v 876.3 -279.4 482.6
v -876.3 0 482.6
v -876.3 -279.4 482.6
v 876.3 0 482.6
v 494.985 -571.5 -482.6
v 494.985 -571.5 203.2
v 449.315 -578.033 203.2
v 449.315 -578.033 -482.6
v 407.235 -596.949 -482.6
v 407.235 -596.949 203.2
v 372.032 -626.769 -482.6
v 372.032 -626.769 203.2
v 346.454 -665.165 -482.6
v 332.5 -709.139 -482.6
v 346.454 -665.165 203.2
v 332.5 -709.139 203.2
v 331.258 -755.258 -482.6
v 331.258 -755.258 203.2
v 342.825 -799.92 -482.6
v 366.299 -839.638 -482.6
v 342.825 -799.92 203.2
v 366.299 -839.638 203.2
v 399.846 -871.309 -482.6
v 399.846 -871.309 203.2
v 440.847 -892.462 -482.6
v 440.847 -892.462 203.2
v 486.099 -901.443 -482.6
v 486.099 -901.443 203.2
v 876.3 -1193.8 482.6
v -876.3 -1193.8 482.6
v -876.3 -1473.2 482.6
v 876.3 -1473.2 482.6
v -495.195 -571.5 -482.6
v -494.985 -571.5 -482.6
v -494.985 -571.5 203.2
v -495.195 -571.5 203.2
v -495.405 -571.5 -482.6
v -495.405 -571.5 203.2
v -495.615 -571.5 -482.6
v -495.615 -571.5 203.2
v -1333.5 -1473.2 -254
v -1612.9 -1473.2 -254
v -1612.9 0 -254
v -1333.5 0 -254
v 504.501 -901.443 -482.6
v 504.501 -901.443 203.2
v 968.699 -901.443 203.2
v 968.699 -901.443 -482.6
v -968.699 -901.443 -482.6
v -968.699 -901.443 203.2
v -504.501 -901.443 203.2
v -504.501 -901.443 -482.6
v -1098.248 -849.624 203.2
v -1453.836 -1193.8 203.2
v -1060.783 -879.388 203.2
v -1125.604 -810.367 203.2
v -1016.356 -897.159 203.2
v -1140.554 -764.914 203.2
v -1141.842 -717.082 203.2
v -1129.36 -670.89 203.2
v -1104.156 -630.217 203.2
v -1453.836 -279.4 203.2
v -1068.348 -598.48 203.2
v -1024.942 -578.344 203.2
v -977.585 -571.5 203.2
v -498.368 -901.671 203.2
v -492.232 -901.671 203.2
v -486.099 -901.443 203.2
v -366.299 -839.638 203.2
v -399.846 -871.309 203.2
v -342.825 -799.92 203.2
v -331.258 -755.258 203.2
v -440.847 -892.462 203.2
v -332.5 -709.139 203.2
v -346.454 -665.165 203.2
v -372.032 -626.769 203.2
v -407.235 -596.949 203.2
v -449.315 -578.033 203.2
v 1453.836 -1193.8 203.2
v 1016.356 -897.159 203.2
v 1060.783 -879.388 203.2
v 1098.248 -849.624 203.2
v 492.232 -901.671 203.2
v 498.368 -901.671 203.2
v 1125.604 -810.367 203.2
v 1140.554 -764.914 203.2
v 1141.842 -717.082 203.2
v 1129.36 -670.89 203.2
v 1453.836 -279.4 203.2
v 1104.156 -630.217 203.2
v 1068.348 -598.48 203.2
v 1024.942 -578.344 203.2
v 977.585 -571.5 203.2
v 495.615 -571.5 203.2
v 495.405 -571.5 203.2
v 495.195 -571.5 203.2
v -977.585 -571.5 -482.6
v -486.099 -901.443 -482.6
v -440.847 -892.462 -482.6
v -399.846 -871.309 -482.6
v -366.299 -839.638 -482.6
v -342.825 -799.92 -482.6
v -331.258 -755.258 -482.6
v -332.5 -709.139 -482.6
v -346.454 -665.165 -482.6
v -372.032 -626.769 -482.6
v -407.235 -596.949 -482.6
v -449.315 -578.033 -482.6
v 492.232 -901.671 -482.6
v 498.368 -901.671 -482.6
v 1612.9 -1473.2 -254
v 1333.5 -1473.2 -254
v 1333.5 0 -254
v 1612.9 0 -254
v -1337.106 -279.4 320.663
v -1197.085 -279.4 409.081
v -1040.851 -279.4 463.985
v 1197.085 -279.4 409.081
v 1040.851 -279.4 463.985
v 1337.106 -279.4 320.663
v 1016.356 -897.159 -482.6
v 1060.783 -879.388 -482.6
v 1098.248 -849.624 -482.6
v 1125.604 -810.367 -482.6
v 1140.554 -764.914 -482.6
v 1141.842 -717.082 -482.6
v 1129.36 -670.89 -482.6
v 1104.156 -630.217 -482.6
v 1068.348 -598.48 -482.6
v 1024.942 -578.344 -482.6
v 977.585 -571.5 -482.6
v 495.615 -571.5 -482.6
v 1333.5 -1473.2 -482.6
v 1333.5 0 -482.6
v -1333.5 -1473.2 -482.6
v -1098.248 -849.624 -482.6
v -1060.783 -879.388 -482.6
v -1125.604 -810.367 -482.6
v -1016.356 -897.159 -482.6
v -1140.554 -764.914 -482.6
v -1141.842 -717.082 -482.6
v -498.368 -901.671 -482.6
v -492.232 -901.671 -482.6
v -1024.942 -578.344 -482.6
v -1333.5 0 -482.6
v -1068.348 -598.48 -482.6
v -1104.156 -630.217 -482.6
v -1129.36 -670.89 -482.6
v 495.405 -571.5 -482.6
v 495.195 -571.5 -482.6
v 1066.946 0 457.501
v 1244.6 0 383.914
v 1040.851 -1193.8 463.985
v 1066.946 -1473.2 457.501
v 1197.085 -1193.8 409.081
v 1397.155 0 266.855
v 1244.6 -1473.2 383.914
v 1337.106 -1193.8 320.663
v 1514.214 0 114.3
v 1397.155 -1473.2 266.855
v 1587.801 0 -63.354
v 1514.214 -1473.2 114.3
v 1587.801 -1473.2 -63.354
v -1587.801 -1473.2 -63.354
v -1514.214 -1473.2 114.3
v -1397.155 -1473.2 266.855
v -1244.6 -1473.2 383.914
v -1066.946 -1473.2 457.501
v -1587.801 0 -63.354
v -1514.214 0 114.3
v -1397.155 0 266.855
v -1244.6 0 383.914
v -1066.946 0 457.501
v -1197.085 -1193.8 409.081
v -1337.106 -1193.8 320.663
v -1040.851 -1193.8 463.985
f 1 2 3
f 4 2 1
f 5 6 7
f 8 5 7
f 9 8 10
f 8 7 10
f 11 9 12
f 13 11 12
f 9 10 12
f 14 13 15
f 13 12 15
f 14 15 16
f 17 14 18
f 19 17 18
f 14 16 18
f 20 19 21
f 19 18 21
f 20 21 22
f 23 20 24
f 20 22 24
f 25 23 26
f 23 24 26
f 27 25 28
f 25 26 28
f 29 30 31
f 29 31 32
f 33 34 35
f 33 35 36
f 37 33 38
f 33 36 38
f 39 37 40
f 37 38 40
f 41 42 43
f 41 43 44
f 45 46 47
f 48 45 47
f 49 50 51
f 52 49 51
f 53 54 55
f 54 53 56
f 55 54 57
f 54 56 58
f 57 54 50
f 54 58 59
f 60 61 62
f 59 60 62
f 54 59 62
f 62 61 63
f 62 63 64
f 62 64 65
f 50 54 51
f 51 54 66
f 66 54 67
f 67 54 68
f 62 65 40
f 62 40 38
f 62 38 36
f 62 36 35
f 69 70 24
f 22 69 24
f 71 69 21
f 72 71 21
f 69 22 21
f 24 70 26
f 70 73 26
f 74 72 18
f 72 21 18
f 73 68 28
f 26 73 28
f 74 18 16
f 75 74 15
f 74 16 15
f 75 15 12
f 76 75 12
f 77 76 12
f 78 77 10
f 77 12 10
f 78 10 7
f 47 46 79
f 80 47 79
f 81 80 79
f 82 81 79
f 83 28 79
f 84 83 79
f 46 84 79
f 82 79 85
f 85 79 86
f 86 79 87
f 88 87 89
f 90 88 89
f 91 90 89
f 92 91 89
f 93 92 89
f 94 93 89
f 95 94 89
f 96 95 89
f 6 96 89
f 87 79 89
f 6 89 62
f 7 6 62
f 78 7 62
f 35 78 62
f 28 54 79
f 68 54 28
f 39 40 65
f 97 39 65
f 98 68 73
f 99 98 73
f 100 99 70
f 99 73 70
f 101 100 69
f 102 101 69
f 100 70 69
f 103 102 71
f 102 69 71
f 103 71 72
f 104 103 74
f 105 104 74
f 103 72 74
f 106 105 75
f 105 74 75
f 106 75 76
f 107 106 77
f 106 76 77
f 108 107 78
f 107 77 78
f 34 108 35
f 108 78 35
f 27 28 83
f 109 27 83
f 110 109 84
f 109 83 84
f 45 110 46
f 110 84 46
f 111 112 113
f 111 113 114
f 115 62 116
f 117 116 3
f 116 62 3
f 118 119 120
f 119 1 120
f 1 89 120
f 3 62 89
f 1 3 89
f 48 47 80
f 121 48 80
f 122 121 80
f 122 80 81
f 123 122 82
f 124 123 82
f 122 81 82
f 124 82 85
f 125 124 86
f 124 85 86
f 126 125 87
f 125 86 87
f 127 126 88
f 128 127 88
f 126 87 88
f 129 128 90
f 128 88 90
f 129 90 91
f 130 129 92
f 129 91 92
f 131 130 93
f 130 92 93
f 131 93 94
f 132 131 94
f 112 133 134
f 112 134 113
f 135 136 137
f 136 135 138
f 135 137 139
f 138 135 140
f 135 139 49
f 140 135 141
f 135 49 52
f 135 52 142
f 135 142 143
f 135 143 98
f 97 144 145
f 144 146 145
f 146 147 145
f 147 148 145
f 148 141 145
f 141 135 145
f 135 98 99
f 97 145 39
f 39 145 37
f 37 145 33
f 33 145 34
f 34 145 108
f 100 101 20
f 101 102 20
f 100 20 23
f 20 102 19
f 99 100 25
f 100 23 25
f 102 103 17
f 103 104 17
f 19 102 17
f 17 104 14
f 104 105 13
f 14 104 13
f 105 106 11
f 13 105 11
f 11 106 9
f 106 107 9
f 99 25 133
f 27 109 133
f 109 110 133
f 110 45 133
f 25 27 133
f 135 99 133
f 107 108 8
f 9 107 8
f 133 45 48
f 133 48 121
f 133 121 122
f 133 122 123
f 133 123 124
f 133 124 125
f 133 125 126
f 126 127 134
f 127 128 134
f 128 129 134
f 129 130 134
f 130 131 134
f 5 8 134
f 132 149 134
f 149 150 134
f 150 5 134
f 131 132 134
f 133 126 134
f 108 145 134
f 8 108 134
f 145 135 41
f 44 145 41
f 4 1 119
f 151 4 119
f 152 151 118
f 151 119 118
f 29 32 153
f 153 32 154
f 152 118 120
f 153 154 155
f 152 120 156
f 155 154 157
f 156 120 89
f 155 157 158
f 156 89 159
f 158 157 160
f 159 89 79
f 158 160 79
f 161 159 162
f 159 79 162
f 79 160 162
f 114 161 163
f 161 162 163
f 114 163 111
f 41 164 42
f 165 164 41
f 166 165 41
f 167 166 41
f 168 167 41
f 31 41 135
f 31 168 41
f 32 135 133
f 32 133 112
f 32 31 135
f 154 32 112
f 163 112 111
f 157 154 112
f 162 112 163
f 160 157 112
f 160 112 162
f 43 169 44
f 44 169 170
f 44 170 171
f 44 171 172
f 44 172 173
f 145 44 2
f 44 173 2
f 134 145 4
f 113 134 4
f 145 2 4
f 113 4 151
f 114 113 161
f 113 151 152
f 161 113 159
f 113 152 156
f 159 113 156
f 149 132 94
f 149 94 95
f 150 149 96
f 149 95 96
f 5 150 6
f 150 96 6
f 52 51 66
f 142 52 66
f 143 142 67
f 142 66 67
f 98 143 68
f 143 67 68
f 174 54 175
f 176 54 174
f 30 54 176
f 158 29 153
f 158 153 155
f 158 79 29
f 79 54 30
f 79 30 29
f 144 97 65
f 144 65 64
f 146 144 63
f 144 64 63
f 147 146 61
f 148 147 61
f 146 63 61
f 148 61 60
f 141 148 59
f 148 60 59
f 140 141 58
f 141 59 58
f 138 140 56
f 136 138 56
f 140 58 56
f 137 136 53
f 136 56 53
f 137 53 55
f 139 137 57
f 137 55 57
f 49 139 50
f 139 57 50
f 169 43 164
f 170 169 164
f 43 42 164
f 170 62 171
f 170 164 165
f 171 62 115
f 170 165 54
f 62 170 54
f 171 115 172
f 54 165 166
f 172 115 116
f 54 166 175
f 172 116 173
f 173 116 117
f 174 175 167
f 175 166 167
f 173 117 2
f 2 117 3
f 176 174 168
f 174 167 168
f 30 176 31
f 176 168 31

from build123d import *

# Parameters (mm, degrees)
F0_W     = 3225.8
F0_H     = 965.2
F1_DEPTH = 1473.2
F3_DEPTH = 965.201
F4_W     = 914.4
F4_H     = 279.4
F5_DEPTH = 3225.801
F6_W     = 279.4
F6_H     = 228.6
F7_DEPTH = 1473.201
F8_R     = 736.59999


# Not quite as in the source:
# - a fillet or chamfer is up to 0.001 mm smaller than in the source, because OpenCascade refuses the exact size


with BuildPart() as f1:
    # F0 (on Front) → F1 (new body)
    with BuildSketch(Plane.XZ):
        Rectangle(F0_W, F0_H)
    extrude(amount=F1_DEPTH)

    # F2 (on face) → F3 (cut, through all)
    with BuildSketch(Plane.XY.offset(482.6)):
        with BuildLine():
            Line((-495.6148372224, -571.5003001895), (-977.5851627776, -571.5003001895))
            ThreePointArc((-977.5851627776, -571.5003001895), (-1142.9401608263, -741.0446950901), (-968.6994670012, -901.4434414605))
            Line((-968.6994670012, -901.4434414605), (-504.5005329988, -901.4434414605))
            Line((-504.5005329988, -901.4434414605), (-486.0994670012, -901.4434414605))
            ThreePointArc((-486.0994670012, -901.4434414605), (-330.2598391737, -732.15530491), (-494.9851627776, -571.5003001895))
            Line((-494.9851627776, -571.5003001895), (-495.6148372224, -571.5003001895))
        make_face()
        with BuildLine():
            ThreePointArc((-494.9851627776, -571.5003001895), (-495.3, -571.5), (-495.6148372224, -571.5003001895))
            Line((-495.6148372224, -571.5003001895), (-494.9851627776, -571.5003001895))
        make_face()
        with BuildLine():
            Line((-486.0994670012, -901.4434414605), (-504.5005329988, -901.4434414605))
            ThreePointArc((-504.5005329988, -901.4434414605), (-495.3, -901.7), (-486.0994670012, -901.4434414605))
        make_face()
        with BuildLine():
            ThreePointArc((968.6994670012, -901.4434414605), (1142.9401608263, -741.0446950901), (977.5851627776, -571.5003001895))
            Line((977.5851627776, -571.5003001895), (495.6148372224, -571.5003001895))
            Line((495.6148372224, -571.5003001895), (494.9851627776, -571.5003001895))
            ThreePointArc((494.9851627776, -571.5003001895), (330.2598391737, -732.15530491), (486.0994670012, -901.4434414605))
            Line((486.0994670012, -901.4434414605), (504.5005329988, -901.4434414605))
            Line((504.5005329988, -901.4434414605), (968.6994670012, -901.4434414605))
        make_face()
        with BuildLine():
            Line((494.9851627776, -571.5003001895), (495.6148372224, -571.5003001895))
            ThreePointArc((495.6148372224, -571.5003001895), (495.3, -571.5), (494.9851627776, -571.5003001895))
        make_face()
        with BuildLine():
            ThreePointArc((486.0994670012, -901.4434414605), (495.3, -901.7), (504.5005329988, -901.4434414605))
            Line((504.5005329988, -901.4434414605), (486.0994670012, -901.4434414605))
        make_face()
    extrude(amount=-F3_DEPTH, mode=Mode.SUBTRACT)

    # F4 (on face) → F5 (cut, through all)
    with BuildSketch(Plane.YZ.offset(1612.9)):
        with Locations((-736.6, 342.9)):
            Rectangle(F4_W, F4_H)
    extrude(amount=-F5_DEPTH, mode=Mode.SUBTRACT)

    # F6 (on face) → F7 (cut, through all)
    with BuildSketch(Plane.XZ.offset(1473.2)):
        with Locations((-1473.2, -368.3)):
            Rectangle(F6_W, F6_H)
        with Locations((1473.2, -368.3)):
            Rectangle(F6_W, F6_H)
    extrude(amount=-F7_DEPTH, mode=Mode.SUBTRACT)

    # F8 (radius 736.6 in the source; OpenCascade refuses exactly that, so slightly less here)
    f8_edges = [f1.edges().sort_by_distance(p)[0] for p in [
        (-1612.9, -1333.5, 482.6),
        (1612.9, -1333.5, 482.6),
    ]]
    fillet(f8_edges, radius=F8_R)


solid = f1.part
